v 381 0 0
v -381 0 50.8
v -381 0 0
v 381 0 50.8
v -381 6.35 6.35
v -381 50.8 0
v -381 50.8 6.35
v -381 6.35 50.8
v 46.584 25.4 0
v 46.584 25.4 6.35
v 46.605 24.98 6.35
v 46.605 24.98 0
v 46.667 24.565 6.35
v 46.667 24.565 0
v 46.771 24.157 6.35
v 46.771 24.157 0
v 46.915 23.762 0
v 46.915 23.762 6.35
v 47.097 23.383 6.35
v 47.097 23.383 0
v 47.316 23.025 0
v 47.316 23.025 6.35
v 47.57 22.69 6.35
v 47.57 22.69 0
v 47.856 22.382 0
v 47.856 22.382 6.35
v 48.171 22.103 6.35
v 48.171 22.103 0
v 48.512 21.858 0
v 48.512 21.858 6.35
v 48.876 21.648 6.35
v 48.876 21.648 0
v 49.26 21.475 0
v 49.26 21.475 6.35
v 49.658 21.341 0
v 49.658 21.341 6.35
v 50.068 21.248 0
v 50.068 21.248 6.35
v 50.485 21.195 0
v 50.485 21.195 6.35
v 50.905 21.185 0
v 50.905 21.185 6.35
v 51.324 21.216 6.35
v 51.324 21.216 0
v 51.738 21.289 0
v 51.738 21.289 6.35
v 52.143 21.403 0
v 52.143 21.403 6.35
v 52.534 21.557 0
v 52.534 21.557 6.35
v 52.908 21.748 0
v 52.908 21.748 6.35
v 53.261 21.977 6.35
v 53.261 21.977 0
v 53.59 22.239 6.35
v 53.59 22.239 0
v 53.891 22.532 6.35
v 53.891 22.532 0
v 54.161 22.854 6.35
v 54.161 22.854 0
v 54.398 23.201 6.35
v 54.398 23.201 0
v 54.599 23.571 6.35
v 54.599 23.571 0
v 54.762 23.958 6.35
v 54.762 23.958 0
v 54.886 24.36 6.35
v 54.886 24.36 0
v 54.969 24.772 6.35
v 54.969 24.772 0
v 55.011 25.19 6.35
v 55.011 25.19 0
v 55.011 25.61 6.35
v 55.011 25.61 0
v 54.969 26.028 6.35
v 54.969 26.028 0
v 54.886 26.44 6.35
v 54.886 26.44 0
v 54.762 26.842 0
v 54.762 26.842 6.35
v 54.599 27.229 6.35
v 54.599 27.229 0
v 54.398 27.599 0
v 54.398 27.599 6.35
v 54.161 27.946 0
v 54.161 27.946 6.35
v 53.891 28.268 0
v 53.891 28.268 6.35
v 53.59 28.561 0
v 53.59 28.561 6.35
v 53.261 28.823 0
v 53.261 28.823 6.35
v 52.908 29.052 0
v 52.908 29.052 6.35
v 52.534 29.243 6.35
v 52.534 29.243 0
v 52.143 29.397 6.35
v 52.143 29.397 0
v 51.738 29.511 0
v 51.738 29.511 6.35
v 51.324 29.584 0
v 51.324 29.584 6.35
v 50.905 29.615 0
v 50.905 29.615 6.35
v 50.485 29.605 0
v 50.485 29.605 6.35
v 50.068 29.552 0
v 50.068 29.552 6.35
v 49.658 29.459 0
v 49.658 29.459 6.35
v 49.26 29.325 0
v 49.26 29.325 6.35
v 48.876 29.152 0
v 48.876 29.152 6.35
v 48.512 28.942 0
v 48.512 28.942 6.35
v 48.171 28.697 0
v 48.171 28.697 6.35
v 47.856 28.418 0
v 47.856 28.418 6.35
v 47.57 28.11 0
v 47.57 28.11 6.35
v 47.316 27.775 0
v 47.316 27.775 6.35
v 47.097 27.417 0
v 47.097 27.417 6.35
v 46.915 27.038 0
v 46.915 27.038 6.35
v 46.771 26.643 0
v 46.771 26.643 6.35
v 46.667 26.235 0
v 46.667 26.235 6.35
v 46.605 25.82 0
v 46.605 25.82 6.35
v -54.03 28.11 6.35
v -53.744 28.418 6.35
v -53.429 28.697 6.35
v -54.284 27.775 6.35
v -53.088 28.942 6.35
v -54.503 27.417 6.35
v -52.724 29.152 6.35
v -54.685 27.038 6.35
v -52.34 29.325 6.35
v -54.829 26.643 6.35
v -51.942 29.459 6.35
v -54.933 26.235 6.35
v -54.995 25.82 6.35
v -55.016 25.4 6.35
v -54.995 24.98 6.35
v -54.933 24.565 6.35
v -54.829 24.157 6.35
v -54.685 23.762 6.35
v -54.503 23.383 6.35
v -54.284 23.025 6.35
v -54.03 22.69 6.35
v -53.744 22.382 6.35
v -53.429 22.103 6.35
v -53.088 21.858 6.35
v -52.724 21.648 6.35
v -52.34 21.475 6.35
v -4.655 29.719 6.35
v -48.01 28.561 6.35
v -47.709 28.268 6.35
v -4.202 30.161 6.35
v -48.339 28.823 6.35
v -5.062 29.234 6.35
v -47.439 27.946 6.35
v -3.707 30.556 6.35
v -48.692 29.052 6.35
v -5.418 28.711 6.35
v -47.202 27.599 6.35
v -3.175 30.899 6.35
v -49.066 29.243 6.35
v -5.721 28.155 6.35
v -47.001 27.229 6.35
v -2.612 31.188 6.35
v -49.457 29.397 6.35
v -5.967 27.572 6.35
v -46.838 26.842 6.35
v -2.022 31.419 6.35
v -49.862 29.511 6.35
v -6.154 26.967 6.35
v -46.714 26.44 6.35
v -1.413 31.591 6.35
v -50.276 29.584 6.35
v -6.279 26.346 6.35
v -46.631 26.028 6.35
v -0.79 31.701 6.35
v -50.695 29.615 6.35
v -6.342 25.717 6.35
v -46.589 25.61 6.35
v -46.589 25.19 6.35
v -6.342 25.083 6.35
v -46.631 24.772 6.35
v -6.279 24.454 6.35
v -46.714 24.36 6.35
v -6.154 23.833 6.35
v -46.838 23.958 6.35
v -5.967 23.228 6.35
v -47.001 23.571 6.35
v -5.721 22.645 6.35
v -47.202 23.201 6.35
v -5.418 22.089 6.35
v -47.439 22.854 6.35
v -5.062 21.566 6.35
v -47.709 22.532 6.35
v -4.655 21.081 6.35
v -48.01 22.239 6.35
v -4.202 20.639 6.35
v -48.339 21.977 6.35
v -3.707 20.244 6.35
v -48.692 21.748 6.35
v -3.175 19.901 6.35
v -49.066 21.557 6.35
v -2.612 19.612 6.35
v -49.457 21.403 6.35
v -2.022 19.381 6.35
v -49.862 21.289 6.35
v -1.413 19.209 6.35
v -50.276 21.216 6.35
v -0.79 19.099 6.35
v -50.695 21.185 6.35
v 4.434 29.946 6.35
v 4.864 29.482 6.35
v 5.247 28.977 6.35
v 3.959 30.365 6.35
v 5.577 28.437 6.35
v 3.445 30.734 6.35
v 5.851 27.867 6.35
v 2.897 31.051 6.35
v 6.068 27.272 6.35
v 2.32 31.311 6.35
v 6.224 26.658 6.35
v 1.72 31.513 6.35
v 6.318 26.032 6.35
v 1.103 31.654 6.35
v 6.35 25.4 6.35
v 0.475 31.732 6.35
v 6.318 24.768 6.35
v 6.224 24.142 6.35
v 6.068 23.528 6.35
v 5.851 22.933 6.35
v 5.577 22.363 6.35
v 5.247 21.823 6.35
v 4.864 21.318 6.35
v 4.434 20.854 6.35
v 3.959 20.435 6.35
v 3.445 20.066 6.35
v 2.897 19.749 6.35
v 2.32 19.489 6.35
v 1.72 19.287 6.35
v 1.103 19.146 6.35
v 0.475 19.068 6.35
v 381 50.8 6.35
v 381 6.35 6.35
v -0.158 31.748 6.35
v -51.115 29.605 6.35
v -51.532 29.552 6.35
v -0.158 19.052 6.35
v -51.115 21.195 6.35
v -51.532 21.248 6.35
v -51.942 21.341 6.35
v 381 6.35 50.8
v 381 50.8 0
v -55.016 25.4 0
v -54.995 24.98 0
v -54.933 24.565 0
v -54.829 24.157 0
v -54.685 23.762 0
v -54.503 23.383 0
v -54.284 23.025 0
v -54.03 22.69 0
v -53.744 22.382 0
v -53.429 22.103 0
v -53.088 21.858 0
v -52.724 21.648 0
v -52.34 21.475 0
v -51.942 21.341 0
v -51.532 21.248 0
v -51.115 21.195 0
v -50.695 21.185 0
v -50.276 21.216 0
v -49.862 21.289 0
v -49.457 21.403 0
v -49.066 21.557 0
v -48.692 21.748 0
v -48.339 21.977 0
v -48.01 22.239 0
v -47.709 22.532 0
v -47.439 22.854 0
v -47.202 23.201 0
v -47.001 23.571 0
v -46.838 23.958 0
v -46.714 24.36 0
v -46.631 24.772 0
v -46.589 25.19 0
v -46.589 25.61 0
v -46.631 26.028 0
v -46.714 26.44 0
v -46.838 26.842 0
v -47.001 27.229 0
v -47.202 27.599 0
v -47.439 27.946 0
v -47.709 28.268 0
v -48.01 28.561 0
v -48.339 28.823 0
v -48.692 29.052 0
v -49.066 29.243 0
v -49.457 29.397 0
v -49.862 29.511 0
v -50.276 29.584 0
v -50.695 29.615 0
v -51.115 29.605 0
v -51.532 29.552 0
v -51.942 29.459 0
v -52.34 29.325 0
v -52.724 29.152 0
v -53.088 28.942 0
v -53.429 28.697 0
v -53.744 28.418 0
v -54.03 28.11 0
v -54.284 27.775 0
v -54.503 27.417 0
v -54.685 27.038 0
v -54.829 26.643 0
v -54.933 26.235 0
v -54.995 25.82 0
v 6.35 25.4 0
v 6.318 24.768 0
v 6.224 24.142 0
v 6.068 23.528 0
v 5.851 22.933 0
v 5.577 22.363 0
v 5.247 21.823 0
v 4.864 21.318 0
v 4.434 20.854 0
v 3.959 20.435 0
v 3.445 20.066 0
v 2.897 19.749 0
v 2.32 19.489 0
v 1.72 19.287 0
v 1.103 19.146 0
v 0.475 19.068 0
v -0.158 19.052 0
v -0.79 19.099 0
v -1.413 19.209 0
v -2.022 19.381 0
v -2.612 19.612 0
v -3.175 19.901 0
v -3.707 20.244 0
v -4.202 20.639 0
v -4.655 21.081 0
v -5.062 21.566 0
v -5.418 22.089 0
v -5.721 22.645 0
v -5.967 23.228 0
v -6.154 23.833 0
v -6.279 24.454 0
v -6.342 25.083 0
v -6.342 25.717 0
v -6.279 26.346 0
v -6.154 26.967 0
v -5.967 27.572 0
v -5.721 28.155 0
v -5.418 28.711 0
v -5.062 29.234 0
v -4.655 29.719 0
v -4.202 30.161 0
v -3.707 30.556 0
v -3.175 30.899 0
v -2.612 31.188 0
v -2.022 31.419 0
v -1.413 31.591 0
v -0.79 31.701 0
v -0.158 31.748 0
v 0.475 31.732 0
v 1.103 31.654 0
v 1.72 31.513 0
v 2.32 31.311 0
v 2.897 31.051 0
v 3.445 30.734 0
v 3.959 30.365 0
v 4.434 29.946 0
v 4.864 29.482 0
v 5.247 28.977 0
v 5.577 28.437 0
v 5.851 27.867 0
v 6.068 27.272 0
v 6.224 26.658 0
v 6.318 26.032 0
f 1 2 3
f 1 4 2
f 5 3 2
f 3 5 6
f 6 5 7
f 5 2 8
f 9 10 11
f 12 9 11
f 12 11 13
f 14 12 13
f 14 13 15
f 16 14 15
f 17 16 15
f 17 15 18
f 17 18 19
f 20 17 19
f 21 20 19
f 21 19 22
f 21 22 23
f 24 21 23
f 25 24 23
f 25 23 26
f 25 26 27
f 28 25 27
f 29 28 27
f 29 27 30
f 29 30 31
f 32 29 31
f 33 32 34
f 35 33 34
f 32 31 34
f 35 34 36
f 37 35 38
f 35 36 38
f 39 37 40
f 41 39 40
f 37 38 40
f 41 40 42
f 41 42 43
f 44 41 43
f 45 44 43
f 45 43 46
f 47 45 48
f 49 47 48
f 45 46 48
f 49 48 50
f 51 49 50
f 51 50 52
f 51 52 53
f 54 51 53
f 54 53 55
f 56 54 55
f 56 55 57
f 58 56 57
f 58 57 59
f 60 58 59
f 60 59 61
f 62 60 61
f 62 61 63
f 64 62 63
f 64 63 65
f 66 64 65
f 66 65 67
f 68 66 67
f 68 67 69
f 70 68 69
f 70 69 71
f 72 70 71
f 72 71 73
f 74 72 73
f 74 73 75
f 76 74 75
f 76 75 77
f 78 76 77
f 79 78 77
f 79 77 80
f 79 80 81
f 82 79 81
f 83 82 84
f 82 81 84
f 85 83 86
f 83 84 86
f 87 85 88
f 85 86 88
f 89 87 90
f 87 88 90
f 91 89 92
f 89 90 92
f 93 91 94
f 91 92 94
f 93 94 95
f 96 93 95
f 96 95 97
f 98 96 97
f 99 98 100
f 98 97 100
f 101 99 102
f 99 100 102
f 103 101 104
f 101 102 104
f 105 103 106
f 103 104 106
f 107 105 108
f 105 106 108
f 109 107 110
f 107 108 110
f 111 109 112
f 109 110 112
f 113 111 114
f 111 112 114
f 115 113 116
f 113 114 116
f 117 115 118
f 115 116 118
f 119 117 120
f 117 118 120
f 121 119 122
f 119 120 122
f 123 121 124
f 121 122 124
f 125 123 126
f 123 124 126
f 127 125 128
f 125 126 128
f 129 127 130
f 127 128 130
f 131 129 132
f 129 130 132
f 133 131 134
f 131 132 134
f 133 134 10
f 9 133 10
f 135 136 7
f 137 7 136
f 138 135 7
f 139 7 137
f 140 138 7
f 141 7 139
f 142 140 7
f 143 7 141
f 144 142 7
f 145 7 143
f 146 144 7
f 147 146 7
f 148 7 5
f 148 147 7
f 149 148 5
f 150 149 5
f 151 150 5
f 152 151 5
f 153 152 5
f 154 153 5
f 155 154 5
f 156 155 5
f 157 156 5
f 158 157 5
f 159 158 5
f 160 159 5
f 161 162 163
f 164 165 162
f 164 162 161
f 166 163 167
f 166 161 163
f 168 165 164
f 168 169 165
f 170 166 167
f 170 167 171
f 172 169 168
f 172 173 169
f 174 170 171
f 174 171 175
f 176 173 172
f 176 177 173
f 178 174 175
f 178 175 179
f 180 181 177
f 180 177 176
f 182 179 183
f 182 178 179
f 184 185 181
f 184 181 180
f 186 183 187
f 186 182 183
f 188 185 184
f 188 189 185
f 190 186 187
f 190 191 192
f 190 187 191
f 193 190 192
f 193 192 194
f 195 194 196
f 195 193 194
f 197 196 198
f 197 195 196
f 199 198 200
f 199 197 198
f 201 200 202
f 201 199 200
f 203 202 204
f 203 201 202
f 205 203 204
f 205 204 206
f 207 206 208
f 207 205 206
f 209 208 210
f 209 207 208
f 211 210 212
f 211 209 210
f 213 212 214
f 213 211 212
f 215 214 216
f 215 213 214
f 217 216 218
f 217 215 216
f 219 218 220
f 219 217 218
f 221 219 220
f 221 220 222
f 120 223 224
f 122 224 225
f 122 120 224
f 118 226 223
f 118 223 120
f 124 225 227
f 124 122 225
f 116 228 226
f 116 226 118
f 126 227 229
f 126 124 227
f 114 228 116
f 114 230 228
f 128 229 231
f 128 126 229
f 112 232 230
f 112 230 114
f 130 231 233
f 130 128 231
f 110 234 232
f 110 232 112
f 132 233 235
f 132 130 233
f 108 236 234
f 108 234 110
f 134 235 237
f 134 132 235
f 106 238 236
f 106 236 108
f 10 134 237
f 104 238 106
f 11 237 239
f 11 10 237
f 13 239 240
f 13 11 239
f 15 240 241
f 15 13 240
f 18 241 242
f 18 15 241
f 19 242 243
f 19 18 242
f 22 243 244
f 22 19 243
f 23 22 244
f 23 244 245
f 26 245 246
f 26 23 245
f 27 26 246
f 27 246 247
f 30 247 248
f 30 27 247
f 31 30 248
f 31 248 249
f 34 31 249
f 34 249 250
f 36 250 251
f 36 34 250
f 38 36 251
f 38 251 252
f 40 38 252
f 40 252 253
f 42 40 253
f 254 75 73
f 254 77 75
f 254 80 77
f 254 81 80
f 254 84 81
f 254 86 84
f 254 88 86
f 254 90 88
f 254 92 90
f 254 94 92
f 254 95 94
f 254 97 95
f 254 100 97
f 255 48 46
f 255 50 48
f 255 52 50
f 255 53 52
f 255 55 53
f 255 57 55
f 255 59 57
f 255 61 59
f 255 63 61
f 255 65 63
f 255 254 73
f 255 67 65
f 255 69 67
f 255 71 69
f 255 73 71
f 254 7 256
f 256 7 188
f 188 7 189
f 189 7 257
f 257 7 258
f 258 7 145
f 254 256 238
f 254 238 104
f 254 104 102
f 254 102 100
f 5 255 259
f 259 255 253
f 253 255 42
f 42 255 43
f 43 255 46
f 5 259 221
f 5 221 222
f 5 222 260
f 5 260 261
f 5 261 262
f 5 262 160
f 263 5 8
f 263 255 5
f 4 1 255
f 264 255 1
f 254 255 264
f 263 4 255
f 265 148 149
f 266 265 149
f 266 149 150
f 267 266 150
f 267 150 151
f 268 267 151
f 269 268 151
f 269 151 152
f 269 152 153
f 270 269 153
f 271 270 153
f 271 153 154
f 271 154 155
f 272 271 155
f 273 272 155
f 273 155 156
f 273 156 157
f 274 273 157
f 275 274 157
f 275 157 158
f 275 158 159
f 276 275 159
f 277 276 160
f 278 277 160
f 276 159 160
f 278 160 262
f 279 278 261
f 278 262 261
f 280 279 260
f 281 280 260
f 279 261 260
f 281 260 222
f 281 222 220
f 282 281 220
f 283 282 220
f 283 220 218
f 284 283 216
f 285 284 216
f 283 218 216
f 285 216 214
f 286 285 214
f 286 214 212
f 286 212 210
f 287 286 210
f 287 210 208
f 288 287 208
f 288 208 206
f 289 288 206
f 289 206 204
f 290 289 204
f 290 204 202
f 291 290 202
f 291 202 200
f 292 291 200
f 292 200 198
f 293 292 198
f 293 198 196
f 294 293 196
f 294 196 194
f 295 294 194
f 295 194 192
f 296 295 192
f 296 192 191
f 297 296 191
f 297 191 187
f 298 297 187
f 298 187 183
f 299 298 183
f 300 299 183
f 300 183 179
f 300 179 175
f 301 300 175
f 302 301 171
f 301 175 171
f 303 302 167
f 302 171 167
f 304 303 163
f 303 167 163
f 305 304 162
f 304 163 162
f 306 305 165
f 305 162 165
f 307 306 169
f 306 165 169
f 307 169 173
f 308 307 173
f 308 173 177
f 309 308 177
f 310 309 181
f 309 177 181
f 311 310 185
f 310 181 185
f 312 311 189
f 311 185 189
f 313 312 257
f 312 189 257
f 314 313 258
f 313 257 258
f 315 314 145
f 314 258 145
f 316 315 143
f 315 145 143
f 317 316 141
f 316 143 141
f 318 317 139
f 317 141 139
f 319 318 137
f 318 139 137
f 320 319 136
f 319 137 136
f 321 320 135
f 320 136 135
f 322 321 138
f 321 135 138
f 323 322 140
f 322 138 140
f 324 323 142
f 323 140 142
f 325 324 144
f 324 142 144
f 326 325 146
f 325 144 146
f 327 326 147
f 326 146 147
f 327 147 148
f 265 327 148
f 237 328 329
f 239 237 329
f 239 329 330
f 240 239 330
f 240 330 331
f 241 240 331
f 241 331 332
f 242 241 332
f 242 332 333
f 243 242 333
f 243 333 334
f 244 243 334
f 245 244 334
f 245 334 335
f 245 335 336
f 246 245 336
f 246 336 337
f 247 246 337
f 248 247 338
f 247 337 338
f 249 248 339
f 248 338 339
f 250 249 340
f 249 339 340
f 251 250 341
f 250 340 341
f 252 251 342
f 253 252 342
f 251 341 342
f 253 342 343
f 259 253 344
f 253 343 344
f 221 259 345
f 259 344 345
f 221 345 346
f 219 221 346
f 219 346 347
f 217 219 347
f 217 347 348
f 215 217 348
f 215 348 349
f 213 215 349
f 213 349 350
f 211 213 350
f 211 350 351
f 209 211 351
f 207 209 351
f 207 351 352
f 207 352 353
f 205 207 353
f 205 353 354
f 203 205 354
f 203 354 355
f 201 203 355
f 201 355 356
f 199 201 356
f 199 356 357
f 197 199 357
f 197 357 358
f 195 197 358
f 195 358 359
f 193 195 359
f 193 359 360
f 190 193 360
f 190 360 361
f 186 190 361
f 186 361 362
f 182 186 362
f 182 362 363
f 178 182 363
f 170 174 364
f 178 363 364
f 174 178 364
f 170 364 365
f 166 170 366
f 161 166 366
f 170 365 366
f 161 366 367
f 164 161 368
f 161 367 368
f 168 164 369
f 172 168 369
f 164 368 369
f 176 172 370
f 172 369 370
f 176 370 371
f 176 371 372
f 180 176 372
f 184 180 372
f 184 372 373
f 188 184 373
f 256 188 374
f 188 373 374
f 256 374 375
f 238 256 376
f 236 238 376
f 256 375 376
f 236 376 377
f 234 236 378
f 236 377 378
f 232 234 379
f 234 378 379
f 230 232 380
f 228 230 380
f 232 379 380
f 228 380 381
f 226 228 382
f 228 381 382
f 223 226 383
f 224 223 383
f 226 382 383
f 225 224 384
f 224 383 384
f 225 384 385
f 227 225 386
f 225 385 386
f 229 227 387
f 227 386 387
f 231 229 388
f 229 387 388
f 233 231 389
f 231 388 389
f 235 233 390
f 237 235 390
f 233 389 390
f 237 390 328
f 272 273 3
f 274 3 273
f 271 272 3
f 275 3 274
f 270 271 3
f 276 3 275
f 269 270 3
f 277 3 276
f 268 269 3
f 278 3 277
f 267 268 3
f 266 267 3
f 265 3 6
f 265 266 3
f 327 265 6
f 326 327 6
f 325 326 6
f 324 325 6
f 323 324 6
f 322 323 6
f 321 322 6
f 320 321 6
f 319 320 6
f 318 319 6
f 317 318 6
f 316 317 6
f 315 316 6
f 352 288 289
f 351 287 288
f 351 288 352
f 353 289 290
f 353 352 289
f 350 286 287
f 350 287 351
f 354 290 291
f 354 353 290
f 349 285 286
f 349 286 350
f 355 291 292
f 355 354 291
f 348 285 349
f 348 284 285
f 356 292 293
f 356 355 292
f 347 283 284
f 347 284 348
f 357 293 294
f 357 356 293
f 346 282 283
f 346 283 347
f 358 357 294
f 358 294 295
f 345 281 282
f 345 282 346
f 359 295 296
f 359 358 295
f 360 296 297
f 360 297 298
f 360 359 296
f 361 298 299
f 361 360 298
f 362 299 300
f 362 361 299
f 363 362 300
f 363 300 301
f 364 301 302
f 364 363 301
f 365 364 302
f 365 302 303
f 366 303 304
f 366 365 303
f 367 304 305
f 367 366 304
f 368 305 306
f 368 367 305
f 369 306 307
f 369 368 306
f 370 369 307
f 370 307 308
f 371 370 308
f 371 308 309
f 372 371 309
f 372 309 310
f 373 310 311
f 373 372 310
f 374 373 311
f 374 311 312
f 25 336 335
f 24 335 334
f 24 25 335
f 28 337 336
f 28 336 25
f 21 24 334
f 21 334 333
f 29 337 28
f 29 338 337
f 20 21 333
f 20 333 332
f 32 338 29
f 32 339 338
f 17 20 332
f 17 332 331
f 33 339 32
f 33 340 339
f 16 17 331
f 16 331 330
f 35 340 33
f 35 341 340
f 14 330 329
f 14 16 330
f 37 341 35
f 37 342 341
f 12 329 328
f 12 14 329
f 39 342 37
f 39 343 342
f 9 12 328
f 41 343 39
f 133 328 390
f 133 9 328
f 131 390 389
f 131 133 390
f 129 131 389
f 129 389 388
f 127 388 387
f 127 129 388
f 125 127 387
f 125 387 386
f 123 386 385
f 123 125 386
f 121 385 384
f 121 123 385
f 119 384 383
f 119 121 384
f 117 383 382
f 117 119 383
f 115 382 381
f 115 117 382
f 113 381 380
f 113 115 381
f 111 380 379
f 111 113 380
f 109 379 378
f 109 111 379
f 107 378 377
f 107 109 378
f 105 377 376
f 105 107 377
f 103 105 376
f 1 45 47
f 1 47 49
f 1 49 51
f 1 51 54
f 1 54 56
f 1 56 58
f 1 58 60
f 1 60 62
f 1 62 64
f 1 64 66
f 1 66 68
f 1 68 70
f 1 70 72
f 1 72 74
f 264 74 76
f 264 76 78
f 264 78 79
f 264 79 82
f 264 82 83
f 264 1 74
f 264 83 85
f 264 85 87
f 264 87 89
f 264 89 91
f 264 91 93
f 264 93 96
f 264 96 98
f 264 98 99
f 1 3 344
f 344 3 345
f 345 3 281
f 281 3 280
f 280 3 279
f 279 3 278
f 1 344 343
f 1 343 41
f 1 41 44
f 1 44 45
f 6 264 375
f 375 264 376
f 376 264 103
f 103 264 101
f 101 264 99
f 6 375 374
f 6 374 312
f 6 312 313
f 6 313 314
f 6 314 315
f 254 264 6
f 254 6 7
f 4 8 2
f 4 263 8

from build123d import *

# Parameters (mm, degrees)
F1_DEPTH = 381
F2_R     = 6.35
F3_DEPTH = 50.801
F5_D     = 8.4328


with BuildPart() as f1:
    # F0 (on Right) → F1 (new body, symmetric)
    with BuildSketch(Plane.YZ):
        Polygon((0, 50.8), (0, 0), (50.8, 0), (50.8, 6.35), (6.35, 6.35), (6.35, 50.8), align=None)
    extrude(amount=F1_DEPTH, both=True)

    # F2 (on face) → F3 (cut, through all)
    with BuildSketch(Plane(origin=(0, 0, 0), x_dir=(1, 0, 0), z_dir=(0, 0, -1))):
        with Locations((0, -25.4)):
            Circle(F2_R)
    extrude(amount=-F3_DEPTH, mode=Mode.SUBTRACT)

    # F5 (through all)
    with Locations(Plane(origin=(0, 0, 0), x_dir=(1, 0, 0), z_dir=(0, 0, -1))):
        with Locations((50.8, -25.4), (-50.8, -25.4)):
            Hole(F5_D / 2)


solid = f1.part
